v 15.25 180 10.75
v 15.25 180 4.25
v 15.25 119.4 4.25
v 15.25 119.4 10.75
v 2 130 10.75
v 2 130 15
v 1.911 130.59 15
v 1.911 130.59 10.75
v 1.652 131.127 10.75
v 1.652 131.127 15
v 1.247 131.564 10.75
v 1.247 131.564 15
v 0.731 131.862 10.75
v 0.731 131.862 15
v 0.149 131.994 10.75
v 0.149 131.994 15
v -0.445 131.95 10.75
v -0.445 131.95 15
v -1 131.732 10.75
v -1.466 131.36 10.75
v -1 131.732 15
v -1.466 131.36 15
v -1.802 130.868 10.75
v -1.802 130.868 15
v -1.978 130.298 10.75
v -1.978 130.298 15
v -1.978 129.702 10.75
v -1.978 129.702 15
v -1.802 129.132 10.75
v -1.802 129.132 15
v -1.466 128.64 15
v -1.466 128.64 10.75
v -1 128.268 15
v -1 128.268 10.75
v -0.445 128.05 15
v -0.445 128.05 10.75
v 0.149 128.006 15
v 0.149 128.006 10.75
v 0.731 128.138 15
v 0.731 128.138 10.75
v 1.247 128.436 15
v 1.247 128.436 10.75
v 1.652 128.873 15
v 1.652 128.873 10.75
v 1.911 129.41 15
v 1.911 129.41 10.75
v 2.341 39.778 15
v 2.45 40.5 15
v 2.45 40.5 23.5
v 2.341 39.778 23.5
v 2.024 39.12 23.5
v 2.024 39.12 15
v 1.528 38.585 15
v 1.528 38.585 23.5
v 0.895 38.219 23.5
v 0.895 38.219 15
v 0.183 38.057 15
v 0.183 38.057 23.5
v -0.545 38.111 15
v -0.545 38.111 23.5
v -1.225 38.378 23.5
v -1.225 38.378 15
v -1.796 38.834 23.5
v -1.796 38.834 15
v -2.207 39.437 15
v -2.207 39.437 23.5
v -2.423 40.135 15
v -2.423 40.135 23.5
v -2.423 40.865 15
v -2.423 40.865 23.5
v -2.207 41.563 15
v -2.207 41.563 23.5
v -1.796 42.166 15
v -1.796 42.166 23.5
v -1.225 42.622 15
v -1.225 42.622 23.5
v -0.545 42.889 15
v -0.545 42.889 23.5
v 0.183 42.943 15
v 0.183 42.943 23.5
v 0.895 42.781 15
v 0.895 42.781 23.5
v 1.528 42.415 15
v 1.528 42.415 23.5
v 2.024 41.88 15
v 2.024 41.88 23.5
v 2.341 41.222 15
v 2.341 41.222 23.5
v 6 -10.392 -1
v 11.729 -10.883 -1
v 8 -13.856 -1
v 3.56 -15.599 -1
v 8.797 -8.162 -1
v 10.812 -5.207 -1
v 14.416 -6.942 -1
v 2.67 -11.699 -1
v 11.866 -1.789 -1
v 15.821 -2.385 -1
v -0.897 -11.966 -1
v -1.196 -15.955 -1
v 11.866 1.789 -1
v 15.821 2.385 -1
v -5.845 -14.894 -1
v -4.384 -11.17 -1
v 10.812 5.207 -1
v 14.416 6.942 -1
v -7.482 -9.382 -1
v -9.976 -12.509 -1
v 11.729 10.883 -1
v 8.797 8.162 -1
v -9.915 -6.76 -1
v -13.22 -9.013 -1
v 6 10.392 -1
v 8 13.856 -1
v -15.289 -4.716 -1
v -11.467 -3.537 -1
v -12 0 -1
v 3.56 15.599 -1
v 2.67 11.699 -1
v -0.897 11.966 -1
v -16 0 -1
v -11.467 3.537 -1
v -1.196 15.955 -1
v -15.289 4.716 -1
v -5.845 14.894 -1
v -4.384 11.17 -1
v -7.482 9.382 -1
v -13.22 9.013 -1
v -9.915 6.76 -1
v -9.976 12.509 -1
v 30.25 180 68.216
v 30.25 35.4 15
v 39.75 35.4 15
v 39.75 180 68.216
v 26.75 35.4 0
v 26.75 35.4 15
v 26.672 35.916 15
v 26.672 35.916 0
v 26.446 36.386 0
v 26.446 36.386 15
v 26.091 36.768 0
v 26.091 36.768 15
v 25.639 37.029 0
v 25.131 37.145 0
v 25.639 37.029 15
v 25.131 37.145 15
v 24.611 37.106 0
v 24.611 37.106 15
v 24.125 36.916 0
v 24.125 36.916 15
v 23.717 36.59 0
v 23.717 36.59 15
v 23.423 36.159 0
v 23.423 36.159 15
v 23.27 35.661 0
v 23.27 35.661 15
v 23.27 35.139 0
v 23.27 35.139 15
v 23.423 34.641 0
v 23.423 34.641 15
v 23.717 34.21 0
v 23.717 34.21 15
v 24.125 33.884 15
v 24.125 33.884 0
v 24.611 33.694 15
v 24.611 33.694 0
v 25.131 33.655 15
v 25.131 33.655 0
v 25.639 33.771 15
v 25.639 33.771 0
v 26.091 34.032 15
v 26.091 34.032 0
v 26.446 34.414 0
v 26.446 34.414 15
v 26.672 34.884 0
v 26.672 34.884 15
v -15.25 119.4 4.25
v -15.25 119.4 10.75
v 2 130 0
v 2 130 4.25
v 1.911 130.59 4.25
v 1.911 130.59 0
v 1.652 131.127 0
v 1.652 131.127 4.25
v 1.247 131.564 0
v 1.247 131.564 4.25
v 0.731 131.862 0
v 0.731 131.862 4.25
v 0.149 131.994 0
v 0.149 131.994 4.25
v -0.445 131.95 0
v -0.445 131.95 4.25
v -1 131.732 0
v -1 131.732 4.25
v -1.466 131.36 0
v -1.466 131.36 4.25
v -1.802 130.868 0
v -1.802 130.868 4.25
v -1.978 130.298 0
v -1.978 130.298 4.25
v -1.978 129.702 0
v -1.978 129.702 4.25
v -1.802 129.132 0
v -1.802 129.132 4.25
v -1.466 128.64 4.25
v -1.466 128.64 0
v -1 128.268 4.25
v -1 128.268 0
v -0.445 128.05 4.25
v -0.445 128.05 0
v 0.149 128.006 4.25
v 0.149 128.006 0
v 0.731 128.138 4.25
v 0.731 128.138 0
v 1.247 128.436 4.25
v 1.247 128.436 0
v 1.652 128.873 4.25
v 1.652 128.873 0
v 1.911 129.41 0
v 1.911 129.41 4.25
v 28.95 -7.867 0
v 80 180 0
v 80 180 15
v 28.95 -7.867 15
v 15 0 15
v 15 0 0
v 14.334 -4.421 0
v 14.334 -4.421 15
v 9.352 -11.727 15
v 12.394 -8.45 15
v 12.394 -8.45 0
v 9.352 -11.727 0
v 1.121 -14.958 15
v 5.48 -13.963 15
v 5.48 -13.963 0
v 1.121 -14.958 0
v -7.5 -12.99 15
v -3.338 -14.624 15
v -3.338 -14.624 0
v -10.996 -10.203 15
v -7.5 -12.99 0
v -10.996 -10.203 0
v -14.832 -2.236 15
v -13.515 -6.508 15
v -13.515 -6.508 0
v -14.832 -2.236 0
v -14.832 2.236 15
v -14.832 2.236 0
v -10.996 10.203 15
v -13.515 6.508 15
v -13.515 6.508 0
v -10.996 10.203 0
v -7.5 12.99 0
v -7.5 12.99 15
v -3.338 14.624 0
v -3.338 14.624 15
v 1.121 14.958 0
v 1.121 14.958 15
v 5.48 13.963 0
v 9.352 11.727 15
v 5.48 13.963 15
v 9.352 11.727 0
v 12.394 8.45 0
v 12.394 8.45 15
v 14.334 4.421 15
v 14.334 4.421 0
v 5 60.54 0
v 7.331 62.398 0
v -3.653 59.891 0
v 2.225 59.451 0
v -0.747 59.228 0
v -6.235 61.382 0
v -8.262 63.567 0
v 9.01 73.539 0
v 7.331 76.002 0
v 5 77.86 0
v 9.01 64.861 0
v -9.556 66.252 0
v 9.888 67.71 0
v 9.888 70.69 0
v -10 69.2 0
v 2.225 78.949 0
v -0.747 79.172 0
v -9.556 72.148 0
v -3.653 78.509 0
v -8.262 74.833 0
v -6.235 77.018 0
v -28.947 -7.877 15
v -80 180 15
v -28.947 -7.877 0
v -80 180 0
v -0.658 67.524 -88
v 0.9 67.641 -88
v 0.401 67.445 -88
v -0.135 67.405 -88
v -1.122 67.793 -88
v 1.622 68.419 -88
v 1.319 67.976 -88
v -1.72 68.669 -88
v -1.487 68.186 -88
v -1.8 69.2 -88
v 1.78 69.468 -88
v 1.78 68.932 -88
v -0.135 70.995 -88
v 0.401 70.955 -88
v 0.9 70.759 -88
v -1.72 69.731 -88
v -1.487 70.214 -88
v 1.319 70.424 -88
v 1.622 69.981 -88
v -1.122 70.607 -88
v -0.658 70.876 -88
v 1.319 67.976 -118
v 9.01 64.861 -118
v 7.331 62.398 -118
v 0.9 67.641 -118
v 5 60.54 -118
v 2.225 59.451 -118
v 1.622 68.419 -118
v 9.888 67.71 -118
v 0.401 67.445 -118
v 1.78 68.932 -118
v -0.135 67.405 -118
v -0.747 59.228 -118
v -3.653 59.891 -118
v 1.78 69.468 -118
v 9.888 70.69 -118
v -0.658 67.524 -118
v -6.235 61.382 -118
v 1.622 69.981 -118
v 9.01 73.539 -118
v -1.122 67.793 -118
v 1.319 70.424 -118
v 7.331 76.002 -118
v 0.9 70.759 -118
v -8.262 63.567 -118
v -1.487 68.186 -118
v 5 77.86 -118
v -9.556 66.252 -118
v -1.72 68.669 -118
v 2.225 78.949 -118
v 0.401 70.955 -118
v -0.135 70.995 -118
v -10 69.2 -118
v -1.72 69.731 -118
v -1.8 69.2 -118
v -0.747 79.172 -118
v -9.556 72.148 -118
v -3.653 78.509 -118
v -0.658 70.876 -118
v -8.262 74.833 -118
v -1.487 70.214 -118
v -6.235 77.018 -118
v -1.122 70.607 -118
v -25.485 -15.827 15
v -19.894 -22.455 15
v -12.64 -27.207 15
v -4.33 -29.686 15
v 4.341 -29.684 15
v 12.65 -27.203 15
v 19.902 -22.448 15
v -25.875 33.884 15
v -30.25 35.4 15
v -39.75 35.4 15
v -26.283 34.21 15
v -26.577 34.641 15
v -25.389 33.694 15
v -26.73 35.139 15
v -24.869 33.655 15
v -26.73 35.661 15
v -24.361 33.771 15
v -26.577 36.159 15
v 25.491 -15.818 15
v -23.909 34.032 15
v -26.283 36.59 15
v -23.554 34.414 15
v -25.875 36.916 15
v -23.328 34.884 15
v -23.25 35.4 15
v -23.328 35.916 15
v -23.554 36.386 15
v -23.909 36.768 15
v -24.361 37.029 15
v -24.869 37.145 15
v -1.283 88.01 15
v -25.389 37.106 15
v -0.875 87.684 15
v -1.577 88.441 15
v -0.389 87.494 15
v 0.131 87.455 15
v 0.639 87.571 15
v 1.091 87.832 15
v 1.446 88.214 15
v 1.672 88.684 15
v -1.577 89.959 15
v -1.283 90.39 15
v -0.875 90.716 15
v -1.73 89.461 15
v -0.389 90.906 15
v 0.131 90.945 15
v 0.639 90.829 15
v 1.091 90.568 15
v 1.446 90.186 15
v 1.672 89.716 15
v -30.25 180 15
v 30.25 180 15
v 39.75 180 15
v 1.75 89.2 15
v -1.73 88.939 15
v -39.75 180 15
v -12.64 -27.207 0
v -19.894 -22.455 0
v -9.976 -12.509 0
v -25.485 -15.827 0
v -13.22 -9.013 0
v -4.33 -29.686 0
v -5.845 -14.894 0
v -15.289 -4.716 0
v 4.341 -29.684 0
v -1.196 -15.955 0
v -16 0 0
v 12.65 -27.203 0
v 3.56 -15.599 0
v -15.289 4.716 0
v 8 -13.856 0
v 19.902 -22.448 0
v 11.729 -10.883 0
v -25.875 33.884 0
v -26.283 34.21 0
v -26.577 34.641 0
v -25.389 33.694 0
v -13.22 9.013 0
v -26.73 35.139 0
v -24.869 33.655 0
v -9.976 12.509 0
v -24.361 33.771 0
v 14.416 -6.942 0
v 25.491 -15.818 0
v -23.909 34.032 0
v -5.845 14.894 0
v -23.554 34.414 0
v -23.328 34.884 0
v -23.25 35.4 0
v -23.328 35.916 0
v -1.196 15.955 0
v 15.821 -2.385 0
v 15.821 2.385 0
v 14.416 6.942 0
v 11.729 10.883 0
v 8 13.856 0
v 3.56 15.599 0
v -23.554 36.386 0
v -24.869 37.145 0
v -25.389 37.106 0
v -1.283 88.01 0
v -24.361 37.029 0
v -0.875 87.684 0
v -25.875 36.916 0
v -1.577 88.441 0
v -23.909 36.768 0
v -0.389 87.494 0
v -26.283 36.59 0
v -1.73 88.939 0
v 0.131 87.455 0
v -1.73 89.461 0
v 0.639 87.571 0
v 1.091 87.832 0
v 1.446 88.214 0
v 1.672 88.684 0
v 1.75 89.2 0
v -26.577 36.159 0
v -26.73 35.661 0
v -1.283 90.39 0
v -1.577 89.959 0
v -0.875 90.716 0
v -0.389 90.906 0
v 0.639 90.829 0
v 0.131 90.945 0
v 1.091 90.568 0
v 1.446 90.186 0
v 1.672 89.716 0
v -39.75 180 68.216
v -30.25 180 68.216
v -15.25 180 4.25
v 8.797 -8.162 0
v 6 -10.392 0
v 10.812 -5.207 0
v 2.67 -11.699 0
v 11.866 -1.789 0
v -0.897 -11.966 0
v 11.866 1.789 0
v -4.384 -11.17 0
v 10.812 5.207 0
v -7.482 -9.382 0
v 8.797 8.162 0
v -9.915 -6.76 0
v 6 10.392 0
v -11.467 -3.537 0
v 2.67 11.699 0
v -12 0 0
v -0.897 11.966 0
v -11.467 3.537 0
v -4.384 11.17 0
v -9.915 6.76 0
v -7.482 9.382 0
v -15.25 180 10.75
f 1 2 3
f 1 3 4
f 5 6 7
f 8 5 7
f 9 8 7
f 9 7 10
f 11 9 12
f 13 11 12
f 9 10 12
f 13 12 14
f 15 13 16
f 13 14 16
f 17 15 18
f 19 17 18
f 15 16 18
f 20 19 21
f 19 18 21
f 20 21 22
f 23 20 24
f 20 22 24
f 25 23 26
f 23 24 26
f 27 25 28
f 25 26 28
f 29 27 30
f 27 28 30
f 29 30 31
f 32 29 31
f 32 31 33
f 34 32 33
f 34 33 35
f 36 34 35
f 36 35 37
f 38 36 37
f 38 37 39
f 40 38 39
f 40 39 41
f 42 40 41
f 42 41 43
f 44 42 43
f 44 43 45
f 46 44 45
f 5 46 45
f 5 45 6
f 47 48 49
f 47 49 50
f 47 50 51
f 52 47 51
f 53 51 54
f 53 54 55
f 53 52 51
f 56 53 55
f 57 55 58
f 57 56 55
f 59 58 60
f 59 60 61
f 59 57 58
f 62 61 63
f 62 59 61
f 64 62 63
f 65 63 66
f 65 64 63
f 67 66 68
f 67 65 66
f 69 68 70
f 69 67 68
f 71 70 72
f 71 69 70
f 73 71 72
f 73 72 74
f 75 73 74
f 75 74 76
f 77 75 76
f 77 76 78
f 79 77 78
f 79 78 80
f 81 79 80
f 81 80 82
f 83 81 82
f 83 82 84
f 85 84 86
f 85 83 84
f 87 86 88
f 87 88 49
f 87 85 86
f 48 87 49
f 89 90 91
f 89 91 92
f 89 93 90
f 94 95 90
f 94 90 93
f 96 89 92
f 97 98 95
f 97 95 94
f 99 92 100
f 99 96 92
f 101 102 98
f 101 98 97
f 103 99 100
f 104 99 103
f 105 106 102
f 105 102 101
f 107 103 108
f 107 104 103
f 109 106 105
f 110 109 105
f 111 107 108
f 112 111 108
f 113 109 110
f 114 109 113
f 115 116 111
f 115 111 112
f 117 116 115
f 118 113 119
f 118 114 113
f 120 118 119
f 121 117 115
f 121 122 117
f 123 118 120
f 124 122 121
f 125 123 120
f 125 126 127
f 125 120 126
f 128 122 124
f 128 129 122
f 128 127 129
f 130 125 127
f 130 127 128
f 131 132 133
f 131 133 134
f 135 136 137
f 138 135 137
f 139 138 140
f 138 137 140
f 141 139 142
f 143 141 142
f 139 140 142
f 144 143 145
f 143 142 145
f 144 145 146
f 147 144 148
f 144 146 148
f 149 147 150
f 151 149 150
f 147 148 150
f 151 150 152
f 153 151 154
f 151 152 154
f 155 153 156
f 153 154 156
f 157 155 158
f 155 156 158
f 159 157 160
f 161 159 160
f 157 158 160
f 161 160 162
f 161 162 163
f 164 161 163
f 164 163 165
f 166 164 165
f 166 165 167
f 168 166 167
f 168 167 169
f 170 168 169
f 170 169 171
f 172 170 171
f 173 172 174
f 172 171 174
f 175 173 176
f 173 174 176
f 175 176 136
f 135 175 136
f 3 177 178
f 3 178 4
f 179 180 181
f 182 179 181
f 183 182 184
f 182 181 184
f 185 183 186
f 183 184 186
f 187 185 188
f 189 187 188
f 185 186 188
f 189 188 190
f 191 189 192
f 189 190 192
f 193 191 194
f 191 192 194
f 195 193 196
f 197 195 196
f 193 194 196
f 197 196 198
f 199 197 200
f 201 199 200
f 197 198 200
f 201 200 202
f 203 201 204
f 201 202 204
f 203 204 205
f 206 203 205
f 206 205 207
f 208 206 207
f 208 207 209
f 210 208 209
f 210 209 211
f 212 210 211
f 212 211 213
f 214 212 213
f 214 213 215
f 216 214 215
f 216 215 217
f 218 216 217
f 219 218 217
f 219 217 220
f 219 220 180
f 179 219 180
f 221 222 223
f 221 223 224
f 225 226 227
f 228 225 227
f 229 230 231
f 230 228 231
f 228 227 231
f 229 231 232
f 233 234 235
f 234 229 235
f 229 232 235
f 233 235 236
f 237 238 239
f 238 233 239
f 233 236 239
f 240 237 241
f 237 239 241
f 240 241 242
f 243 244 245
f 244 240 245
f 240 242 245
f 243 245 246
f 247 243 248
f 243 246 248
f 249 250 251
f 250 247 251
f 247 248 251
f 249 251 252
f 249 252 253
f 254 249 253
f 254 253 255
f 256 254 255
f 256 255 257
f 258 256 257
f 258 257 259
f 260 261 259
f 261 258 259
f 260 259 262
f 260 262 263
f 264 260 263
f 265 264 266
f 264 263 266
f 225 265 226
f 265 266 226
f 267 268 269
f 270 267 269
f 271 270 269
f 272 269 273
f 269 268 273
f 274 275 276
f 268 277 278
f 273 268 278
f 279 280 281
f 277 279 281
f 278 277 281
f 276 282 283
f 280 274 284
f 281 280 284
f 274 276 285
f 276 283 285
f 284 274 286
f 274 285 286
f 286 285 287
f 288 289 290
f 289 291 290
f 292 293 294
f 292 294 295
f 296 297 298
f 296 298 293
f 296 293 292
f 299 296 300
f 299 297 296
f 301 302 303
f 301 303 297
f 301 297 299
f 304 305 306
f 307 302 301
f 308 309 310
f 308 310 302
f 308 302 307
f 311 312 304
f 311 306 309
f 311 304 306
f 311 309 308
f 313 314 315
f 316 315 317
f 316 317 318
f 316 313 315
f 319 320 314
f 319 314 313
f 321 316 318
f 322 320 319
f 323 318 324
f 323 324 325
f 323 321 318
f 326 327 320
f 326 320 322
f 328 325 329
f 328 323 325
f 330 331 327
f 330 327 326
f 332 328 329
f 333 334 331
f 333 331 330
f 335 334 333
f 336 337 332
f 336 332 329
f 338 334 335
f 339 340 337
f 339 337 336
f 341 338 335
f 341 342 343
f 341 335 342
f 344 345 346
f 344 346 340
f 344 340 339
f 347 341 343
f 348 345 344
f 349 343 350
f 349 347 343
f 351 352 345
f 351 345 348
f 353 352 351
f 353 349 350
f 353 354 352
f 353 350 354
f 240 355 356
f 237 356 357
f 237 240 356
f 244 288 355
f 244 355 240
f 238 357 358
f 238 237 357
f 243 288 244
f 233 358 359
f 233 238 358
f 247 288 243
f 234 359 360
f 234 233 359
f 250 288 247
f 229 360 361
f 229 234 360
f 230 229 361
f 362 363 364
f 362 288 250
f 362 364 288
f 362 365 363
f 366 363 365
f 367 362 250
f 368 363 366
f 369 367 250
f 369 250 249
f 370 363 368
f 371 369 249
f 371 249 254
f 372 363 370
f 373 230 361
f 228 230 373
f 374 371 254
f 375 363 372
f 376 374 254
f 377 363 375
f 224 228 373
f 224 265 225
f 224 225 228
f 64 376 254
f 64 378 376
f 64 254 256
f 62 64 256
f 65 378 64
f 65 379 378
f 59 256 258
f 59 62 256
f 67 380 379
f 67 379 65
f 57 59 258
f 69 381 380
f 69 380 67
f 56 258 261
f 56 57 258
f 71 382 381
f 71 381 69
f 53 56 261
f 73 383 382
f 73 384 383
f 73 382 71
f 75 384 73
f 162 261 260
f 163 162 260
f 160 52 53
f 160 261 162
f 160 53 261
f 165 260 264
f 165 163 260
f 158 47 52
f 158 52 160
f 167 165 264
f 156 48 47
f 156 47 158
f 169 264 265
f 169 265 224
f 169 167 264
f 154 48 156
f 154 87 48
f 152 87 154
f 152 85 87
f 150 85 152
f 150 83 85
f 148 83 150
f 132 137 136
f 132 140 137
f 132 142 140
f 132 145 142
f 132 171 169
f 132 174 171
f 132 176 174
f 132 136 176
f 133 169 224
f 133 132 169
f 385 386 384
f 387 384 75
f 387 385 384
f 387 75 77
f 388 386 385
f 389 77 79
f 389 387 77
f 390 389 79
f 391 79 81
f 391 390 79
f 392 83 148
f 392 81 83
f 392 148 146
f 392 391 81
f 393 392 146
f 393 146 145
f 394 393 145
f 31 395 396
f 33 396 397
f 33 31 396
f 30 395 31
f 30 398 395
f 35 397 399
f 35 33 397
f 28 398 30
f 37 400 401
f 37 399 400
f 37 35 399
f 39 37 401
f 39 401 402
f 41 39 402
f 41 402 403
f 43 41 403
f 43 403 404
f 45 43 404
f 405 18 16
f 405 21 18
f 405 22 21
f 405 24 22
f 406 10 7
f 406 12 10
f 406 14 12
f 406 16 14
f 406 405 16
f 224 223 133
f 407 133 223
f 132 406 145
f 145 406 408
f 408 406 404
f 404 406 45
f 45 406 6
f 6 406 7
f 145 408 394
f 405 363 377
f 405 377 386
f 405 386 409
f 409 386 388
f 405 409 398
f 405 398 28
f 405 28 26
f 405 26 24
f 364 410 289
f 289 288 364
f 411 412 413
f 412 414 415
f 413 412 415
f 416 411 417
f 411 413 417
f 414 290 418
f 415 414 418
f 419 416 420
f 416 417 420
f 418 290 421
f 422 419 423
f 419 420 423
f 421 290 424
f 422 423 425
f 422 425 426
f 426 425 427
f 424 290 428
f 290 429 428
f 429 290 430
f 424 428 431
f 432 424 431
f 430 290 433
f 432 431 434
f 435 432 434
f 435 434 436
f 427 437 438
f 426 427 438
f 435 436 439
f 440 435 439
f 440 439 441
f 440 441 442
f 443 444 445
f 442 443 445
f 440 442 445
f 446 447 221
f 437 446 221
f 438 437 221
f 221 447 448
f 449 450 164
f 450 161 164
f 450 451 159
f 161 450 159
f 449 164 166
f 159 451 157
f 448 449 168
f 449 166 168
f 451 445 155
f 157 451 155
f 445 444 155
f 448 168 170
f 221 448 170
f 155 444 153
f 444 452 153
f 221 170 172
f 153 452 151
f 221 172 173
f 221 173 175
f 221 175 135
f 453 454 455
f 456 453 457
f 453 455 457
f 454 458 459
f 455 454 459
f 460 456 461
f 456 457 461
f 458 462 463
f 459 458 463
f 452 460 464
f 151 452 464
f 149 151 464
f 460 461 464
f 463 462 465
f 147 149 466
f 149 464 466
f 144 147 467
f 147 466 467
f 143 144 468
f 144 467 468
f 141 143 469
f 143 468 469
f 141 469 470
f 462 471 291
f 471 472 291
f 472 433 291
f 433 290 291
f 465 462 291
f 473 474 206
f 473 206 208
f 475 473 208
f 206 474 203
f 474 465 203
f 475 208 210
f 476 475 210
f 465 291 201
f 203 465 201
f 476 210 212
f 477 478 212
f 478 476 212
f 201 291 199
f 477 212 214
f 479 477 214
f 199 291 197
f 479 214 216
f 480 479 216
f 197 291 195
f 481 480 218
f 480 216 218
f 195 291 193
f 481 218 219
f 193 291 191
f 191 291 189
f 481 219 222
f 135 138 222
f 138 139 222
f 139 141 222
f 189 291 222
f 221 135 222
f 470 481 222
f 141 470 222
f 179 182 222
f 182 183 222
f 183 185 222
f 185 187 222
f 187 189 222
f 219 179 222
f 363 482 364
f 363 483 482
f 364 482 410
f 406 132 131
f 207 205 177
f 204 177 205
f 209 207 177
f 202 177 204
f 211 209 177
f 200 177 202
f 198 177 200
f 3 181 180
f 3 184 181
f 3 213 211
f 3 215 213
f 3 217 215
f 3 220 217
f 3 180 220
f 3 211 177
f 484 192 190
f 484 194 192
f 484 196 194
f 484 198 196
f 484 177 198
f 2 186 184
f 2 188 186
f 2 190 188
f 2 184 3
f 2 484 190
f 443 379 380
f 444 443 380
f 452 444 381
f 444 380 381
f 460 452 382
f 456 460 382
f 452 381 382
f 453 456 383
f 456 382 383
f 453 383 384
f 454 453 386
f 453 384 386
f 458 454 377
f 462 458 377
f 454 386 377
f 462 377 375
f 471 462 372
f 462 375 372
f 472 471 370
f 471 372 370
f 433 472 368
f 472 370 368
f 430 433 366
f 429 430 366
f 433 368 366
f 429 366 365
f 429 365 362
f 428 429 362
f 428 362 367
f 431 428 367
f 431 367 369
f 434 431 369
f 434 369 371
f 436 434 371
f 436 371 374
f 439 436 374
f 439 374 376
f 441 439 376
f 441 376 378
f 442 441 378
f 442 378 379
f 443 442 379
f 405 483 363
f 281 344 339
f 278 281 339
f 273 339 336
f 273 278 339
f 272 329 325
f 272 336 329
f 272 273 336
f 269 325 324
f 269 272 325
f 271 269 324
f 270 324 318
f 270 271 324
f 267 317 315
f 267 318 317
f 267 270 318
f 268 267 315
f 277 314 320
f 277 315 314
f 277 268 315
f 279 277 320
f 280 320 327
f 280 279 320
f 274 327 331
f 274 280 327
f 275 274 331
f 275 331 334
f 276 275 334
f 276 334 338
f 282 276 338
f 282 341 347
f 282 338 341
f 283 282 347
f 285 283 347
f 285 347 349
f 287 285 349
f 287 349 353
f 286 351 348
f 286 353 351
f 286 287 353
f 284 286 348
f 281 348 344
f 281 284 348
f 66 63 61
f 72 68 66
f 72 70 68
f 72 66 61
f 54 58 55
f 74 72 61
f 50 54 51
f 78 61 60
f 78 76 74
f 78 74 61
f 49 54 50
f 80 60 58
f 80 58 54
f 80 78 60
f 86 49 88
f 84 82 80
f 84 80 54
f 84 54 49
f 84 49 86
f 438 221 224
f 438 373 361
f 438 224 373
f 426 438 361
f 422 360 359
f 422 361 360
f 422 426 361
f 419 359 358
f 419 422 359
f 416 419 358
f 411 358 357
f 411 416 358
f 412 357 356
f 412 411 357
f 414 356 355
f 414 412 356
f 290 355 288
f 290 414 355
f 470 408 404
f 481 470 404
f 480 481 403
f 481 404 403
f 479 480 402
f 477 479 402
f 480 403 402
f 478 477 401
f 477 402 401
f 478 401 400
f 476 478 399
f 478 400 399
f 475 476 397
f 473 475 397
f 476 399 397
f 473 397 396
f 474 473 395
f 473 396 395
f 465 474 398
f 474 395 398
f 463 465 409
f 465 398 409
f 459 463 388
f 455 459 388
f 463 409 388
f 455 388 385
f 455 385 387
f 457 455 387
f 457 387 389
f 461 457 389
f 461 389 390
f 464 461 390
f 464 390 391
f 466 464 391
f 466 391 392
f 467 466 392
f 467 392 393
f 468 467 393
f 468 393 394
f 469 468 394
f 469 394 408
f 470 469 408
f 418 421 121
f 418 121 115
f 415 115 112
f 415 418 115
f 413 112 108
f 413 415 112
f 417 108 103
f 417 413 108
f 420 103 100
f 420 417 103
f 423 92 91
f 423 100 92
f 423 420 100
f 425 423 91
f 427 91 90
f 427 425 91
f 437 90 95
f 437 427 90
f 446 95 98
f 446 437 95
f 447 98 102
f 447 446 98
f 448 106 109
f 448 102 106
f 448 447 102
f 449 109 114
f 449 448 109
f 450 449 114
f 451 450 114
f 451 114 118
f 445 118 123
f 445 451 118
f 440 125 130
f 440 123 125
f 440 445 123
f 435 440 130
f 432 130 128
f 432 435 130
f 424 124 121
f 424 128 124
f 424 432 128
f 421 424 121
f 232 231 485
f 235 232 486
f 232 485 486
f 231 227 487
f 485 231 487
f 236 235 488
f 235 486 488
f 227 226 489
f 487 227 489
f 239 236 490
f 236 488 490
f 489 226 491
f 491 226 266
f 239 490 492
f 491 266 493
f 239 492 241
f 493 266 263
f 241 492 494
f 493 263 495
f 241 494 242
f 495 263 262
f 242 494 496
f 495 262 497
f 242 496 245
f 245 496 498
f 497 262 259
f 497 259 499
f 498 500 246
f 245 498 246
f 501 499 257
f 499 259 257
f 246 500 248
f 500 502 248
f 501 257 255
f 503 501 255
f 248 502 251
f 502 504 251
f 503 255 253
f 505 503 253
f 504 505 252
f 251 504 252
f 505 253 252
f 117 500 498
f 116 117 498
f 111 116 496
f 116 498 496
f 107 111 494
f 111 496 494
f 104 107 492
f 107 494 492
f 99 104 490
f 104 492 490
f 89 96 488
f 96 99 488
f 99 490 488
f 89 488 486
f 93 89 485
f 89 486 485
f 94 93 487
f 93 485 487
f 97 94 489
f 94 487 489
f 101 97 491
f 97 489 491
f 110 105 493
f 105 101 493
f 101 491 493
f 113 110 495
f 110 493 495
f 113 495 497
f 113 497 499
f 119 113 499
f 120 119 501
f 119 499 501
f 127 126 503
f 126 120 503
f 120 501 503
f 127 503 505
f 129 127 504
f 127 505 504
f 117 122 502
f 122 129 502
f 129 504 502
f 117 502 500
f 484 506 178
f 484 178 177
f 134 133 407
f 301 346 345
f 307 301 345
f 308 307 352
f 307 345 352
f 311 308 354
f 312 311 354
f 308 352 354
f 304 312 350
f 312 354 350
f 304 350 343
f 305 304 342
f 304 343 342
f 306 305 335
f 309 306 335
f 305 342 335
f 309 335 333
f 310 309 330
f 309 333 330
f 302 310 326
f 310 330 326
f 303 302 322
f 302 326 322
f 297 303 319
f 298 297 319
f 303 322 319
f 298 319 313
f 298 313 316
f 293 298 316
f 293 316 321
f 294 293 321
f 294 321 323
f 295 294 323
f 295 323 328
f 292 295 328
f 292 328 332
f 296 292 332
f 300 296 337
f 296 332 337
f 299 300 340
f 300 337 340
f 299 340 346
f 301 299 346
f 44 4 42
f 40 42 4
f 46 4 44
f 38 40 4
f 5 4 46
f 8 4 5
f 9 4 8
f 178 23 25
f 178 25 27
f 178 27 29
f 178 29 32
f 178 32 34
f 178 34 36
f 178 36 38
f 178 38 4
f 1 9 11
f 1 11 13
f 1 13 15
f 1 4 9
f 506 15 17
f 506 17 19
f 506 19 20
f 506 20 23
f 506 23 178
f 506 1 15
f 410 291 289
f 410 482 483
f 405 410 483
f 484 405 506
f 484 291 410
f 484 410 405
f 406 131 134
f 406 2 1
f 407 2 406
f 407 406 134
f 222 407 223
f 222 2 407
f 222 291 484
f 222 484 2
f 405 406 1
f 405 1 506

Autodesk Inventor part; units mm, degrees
ref_plane "YZ Plane" through (0, 0, 0) normal (1, 0, 0) x (0, 1, 0)
ref_plane "XZ Plane" through (0, 0, 0) normal (0, 1, 0) x (-1, 0, 0)
sketch "스케치1" plane through (0, 0, 0) normal (0, 0, 1) x (1, 0, 0)
  circle A0 centre (0, 0) radius 15
  circle A1 centre (0, 0) radius 30
  line L0 (80, 180) -> (0, 180)
  line L1 (80, 180) -> (28.9502, -7.8668)
  line L2 (-80, 180) -> (0, 180)
  line L3 (-80, 180) -> (-28.9474, -7.8772)
  line L4 (0, 180) -> (0, 141) construction
  circle A2 centre (0, 0) radius 5 projected
  circle A3 centre (0, 0) radius 7.5 projected
  circle A4 centre (0, 0) radius 5.5 projected
  point P0 (-28.9502, -7.8668)
  dimension "d8" = 60
  dimension "d4" = 80
  dimension "d7" = 30
  dimension "d24" = 180
extrude "돌출1" add sketch "스케치1" along normal blind 15 contours A1 | A1 L3 L2 L0 L1
sketch "스케치2" plane through (0, 0, 15) normal (0, 0, 1) x (1, 0, 0)
  arc A0 (-28.9502, -7.8668) -> (28.9502, -7.8668) centre (0, 0) ccw projected
  circle A1 centre (0, 0) radius 15 projected
  line L0 (0, 0) -> (0, 40.5)
  line L1 (10, 30.7) -> (-10, 30.7)
  line L2 (-10, 30.7) -> (-10, 85.7)
  line L3 (-10, 85.7) -> (10, 85.7)
  line L4 (10, 85.7) -> (10, 30.7)
  circle A2 centre (0, 40.5) radius 2.45
  dimension "d10" = 9.8
  dimension "d11" = 20
  dimension "d12" = 40.5
  dimension "d13" = 55
  dimension "d14" = 4.9
extrude "돌출2" add sketch "스케치2" along normal blind 8.5 contours A2
sketch "스케치3" plane through (0, 0, 15) normal (0, 0, 1) x (1, 0, 0)
  circle A0 centre (-25, 35.4) radius 2 projected
  circle A1 centre (0, 40.5) radius 2.45 projected
  line L0 (28.9502, -7.8668) -> (80, 180) projected
  line L1 (80, 180) -> (-80, 180) projected
  line L2 (-80, 180) -> (-28.9502, -7.8668) projected
  arc A2 (-28.9502, -7.8668) -> (28.9502, -7.8668) centre (0, 0) ccw projected
  circle A3 centre (0, 0) radius 15 projected
  circle A4 centre (25, 35.4) radius 2 projected
  circle A5 centre (0, 89.2) radius 2 projected
  circle A6 centre (-25, 35.4) radius 1.75
  circle A7 centre (25, 35.4) radius 1.75
  circle A8 centre (0, 89.2) radius 1.75
  dimension "d19" = 3.5
  dimension "d20" = 3.5
  dimension "d21" = 3.5
extrude "돌출3" cut sketch "스케치3" against normal through all contours A6 | A7 | A8
ref_plane "작업 평면1" through (35, 38.4, 34) normal (1, 0, 0) x (0, 1, 0)
sketch "스케치4" plane through (35, 38.4, 34) normal (1, 0, 0) x (0, 1, 0)
  line L0 (-46.2668, -19) -> (141.6, -19) projected
  line L1 (154.6, -242) -> (154.6, 58) projected
  line L2 (-3, -19) -> (141.6, 34.2157)
  line L3 (-46.2668, -34) -> (141.6, -34) projected
  line L4 (141.6, -34) -> (141.6, -19) projected
  line L5 (-46.2668, -19) -> (141.6, -19) projected
  line L6 (-46.2668, -34) -> (-46.2668, -19) projected
  line L7 (141.6, -19) -> (141.6, 34.2157)
  point P0 (-38.4, -34)
  point P1 (154.6, 58)
extrude "돌출4" add sketch "스케치4" along normal mid plane 9.5 contours L2 L7 L0
mirror "미러1" about plane through (0, 0, 0) normal (1, 0, 0) of "돌출4"
sketch "스케치5" plane through (0, 0, 15) normal (0, 0, 1) x (1, 0, 0)
  line L0 (-39.75, 35.4) -> (-39.75, 180) projected
  line L1 (-39.75, 180) -> (-80, 180) projected
  line L2 (-80, 180) -> (-28.9502, -7.8668) projected
  arc A0 (-28.9502, -7.8668) -> (28.9502, -7.8668) centre (0, 0) ccw projected
  line L3 (28.9502, -7.8668) -> (80, 180) projected
  line L4 (80, 180) -> (39.75, 180) projected
  line L5 (39.75, 180) -> (39.75, 35.4) projected
  line L6 (39.75, 35.4) -> (30.25, 35.4) projected
  line L7 (30.25, 35.4) -> (30.25, 180) projected
  line L8 (30.25, 180) -> (-30.25, 180) projected
  line L9 (-30.25, 180) -> (-30.25, 35.4) projected
  line L10 (-30.25, 35.4) -> (-39.75, 35.4) projected
  circle A1 centre (0, 0) radius 15 projected
  circle A2 centre (0, 40.5) radius 2.45 projected
  circle A3 centre (25, 35.4) radius 1.75 projected
  circle A4 centre (-25, 35.4) radius 1.75 projected
  circle A5 centre (0, 89.2) radius 1.75 projected
sketch "스케치6" plane through (-80, 180, 0) normal (0, 1, 0) x (1, 0, 0)
  line L0 (160, 0) -> (0, 0) projected
  line L1 (110.25, -15) -> (49.75, -15) projected
  line L2 (65, -4.5) -> (95, -4.5)
  line L3 (95, -4.5) -> (95, -10.5)
  line L4 (95, -10.5) -> (65, -10.5)
  line L5 (65, -10.5) -> (65, -4.5)
  line L6 (80, 0) -> (80, -15) construction
  line L7 (64.75, -4.25) -> (95.25, -4.25)
  line L8 (95.25, -4.25) -> (95.25, -10.75)
  line L9 (95.25, -10.75) -> (64.75, -10.75)
  line L10 (64.75, -10.75) -> (64.75, -4.25)
  dimension "d25" = 6
  dimension "d26" = 30
  dimension "d27" = 4.5
  dimension "d28" = 0.25
extrude "돌출5" cut sketch "스케치6" against normal blind 60.6 contours L2 L3 L4 L5 | L7 L8 L9 L10
sketch "스케치7" plane through (0, 0, 15) normal (0, 0, 1) x (1, 0, 0)
  line L0 (30.25, 180) -> (-30.25, 180) projected
  circle A0 centre (0, 89.2) radius 1.75 projected
  circle A1 centre (0, 130) radius 2
  dimension "d31" = 4
  dimension "d32" = 50
extrude "돌출6" cut sketch "스케치7" against normal through all contours A1
sketch "스케치10" plane through (0, 0, 0) normal (0, 0, -1) x (-1, 0, 0)
  circle A0 centre (0, 0) radius 15 projected
  circle A1 centre (0, 0) radius 12
  circle A2 centre (0, 0) radius 16
  dimension "d42" = 3
  dimension "d43" = 1
extrude "돌출9" add sketch "스케치10" along normal blind 1 contours A0 | A2
sketch "스케치8" plane through (0, 0, 0) normal (0, 0, -1) x (-1, 0, 0)
  circle A0 centre (0, 89.2) radius 1.75 projected
  circle A1 centre (0, 69.2) radius 10
  dimension "d35" = 20
  dimension "d36" = 20
ref_plane "작업 평면2" through (-80, -30, -118) normal (0, 0, 1) x (1, 0, 0)
extrude "돌출7" add sketch "스케치8" along normal up to surface (118 mm away) separate body contours A1
sketch "스케치9" plane through (0, 69.2, -118) normal (0, 0, -1) x (-1, 0, 0)
  circle A0 centre (0, 0) radius 10 projected
  circle A1 centre (0, 0) radius 1.8
  point P0 (0, -69.2)
  dimension "d39" = 3.6
extrude "돌출8" cut sketch "스케치9" against normal blind 30 contours A1 bodies 2
properties part number "Pitch_axis"
